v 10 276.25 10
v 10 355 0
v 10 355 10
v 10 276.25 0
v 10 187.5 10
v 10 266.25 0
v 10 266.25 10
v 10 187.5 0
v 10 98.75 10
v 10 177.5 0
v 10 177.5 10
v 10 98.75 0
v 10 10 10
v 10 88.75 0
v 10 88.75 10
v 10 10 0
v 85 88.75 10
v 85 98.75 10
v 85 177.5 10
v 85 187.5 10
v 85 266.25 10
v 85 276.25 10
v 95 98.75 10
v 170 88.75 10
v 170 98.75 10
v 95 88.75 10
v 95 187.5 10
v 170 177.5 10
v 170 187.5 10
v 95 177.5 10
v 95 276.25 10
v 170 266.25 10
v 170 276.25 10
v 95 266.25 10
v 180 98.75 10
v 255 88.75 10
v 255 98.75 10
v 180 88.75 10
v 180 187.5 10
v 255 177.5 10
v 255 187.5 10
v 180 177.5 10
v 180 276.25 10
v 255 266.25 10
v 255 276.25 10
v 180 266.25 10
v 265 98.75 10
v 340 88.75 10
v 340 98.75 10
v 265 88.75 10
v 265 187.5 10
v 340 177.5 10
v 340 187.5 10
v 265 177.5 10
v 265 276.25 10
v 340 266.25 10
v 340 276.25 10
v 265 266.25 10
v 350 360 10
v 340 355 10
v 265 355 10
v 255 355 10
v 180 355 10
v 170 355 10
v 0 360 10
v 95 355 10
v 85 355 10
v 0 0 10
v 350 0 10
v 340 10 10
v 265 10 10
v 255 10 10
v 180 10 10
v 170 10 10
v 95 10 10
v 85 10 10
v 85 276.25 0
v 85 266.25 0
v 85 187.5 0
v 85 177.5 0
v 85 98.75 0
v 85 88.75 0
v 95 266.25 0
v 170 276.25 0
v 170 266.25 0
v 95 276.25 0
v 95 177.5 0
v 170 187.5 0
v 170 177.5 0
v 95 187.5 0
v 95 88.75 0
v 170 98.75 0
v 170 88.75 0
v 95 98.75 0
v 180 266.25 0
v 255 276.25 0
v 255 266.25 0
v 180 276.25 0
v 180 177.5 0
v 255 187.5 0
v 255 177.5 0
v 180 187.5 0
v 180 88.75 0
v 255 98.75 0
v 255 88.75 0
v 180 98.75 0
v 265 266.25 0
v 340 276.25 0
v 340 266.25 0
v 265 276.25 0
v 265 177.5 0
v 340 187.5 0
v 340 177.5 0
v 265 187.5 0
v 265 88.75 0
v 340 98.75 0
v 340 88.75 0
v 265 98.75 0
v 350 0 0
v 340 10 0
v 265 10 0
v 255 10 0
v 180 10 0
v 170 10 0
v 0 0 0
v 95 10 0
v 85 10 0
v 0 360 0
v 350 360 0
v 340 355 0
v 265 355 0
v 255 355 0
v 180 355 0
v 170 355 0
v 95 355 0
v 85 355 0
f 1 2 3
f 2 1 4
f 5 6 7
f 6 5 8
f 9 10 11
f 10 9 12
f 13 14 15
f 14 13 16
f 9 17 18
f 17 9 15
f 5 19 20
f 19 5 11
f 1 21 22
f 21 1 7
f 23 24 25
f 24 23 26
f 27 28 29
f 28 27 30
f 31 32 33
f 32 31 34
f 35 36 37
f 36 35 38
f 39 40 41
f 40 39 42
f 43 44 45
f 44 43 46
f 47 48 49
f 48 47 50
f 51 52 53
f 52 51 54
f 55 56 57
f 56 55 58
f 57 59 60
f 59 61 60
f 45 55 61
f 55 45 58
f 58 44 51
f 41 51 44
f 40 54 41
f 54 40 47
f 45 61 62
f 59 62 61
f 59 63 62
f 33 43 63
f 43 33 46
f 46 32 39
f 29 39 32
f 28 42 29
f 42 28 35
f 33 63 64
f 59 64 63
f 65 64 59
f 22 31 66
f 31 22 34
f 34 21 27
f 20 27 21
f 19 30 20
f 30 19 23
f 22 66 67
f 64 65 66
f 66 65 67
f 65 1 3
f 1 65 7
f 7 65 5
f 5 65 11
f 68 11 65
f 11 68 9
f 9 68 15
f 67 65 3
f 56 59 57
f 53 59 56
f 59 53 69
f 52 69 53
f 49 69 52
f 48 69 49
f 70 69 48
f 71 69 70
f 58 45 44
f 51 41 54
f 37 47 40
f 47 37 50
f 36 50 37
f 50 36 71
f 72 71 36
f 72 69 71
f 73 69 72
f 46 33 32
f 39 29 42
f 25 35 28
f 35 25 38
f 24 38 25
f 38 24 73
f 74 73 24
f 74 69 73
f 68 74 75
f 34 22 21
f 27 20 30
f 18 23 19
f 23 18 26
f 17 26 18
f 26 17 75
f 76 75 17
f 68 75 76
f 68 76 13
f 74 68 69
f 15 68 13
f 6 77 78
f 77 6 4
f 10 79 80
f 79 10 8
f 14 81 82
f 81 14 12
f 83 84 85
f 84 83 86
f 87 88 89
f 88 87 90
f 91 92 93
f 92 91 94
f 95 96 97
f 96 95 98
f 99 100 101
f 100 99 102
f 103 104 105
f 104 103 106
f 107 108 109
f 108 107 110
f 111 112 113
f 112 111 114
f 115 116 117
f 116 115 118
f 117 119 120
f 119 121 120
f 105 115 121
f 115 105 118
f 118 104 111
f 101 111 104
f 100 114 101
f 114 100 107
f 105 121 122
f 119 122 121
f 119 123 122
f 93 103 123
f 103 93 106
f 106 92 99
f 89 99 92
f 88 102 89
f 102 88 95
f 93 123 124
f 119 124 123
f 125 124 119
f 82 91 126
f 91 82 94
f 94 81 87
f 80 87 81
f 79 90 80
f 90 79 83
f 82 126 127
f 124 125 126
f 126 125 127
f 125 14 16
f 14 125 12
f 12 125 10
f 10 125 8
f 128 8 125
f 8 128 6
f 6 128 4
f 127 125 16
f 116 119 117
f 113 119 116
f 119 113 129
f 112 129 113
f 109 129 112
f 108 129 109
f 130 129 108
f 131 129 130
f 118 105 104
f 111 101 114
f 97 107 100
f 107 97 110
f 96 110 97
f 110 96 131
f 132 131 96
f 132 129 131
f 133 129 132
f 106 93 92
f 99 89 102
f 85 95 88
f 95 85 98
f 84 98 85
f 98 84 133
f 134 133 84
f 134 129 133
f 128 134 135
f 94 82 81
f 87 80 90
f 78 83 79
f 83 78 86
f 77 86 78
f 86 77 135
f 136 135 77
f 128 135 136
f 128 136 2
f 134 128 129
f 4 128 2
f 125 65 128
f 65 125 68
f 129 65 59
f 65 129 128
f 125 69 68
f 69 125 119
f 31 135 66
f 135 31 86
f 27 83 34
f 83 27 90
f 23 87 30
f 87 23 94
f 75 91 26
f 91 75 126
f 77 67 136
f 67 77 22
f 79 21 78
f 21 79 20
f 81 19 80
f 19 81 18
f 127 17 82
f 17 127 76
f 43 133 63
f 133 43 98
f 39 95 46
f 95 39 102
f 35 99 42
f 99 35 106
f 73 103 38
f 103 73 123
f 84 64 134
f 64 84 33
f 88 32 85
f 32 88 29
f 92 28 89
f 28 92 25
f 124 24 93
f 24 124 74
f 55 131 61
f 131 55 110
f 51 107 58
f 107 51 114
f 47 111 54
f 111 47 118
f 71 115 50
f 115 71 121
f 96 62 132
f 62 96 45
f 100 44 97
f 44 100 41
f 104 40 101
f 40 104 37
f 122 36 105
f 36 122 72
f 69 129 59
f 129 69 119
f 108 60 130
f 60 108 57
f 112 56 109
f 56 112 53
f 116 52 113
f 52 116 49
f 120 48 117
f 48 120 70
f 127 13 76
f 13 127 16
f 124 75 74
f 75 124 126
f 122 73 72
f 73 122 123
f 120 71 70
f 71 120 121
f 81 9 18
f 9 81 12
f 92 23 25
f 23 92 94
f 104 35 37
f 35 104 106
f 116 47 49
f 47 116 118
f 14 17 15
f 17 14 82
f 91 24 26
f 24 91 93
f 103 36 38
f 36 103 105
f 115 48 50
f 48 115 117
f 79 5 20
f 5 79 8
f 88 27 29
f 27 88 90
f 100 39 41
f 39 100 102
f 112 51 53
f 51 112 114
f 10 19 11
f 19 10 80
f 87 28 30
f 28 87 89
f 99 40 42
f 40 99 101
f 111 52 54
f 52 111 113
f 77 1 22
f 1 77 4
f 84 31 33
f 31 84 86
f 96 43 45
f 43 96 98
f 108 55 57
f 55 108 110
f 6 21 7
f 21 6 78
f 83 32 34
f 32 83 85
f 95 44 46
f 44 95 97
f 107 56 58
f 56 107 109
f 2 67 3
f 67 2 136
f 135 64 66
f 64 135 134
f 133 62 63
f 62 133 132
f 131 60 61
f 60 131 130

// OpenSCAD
// face_band.scad reused for back lower band (rotated so thickness extends toward negative Y)

width = 350;
band_h = 360;
thk = 10;
full_height = 720;
h_bar_count = 9;
h_gap = (full_height - h_bar_count * thk) / (h_bar_count - 1);
v_gap_count = 4;
v_bars = v_gap_count + 1;
v_gap = (width - v_bars * thk) / v_gap_count;
$fn = 32;

module face_band(w=width, bh=band_h, t=thk) {
    union() {
        for (i = [0 : v_bars - 1]) {
            x = i * (t + v_gap);
            translate([x, 0, 0]) cube([t, bh, t]);
        }
        for (j = [0 : h_bar_count - 1]) {
            y_full = j * (t + h_gap);
            if (y_full < bh && (y_full + t) > 0) {
                intersection() {
                    translate([0, y_full, 0]) cube([w, t, t]);
                    translate([0, 0, 0]) cube([w, bh, t]);
                }
            }
        }
    }
}

face_band();
